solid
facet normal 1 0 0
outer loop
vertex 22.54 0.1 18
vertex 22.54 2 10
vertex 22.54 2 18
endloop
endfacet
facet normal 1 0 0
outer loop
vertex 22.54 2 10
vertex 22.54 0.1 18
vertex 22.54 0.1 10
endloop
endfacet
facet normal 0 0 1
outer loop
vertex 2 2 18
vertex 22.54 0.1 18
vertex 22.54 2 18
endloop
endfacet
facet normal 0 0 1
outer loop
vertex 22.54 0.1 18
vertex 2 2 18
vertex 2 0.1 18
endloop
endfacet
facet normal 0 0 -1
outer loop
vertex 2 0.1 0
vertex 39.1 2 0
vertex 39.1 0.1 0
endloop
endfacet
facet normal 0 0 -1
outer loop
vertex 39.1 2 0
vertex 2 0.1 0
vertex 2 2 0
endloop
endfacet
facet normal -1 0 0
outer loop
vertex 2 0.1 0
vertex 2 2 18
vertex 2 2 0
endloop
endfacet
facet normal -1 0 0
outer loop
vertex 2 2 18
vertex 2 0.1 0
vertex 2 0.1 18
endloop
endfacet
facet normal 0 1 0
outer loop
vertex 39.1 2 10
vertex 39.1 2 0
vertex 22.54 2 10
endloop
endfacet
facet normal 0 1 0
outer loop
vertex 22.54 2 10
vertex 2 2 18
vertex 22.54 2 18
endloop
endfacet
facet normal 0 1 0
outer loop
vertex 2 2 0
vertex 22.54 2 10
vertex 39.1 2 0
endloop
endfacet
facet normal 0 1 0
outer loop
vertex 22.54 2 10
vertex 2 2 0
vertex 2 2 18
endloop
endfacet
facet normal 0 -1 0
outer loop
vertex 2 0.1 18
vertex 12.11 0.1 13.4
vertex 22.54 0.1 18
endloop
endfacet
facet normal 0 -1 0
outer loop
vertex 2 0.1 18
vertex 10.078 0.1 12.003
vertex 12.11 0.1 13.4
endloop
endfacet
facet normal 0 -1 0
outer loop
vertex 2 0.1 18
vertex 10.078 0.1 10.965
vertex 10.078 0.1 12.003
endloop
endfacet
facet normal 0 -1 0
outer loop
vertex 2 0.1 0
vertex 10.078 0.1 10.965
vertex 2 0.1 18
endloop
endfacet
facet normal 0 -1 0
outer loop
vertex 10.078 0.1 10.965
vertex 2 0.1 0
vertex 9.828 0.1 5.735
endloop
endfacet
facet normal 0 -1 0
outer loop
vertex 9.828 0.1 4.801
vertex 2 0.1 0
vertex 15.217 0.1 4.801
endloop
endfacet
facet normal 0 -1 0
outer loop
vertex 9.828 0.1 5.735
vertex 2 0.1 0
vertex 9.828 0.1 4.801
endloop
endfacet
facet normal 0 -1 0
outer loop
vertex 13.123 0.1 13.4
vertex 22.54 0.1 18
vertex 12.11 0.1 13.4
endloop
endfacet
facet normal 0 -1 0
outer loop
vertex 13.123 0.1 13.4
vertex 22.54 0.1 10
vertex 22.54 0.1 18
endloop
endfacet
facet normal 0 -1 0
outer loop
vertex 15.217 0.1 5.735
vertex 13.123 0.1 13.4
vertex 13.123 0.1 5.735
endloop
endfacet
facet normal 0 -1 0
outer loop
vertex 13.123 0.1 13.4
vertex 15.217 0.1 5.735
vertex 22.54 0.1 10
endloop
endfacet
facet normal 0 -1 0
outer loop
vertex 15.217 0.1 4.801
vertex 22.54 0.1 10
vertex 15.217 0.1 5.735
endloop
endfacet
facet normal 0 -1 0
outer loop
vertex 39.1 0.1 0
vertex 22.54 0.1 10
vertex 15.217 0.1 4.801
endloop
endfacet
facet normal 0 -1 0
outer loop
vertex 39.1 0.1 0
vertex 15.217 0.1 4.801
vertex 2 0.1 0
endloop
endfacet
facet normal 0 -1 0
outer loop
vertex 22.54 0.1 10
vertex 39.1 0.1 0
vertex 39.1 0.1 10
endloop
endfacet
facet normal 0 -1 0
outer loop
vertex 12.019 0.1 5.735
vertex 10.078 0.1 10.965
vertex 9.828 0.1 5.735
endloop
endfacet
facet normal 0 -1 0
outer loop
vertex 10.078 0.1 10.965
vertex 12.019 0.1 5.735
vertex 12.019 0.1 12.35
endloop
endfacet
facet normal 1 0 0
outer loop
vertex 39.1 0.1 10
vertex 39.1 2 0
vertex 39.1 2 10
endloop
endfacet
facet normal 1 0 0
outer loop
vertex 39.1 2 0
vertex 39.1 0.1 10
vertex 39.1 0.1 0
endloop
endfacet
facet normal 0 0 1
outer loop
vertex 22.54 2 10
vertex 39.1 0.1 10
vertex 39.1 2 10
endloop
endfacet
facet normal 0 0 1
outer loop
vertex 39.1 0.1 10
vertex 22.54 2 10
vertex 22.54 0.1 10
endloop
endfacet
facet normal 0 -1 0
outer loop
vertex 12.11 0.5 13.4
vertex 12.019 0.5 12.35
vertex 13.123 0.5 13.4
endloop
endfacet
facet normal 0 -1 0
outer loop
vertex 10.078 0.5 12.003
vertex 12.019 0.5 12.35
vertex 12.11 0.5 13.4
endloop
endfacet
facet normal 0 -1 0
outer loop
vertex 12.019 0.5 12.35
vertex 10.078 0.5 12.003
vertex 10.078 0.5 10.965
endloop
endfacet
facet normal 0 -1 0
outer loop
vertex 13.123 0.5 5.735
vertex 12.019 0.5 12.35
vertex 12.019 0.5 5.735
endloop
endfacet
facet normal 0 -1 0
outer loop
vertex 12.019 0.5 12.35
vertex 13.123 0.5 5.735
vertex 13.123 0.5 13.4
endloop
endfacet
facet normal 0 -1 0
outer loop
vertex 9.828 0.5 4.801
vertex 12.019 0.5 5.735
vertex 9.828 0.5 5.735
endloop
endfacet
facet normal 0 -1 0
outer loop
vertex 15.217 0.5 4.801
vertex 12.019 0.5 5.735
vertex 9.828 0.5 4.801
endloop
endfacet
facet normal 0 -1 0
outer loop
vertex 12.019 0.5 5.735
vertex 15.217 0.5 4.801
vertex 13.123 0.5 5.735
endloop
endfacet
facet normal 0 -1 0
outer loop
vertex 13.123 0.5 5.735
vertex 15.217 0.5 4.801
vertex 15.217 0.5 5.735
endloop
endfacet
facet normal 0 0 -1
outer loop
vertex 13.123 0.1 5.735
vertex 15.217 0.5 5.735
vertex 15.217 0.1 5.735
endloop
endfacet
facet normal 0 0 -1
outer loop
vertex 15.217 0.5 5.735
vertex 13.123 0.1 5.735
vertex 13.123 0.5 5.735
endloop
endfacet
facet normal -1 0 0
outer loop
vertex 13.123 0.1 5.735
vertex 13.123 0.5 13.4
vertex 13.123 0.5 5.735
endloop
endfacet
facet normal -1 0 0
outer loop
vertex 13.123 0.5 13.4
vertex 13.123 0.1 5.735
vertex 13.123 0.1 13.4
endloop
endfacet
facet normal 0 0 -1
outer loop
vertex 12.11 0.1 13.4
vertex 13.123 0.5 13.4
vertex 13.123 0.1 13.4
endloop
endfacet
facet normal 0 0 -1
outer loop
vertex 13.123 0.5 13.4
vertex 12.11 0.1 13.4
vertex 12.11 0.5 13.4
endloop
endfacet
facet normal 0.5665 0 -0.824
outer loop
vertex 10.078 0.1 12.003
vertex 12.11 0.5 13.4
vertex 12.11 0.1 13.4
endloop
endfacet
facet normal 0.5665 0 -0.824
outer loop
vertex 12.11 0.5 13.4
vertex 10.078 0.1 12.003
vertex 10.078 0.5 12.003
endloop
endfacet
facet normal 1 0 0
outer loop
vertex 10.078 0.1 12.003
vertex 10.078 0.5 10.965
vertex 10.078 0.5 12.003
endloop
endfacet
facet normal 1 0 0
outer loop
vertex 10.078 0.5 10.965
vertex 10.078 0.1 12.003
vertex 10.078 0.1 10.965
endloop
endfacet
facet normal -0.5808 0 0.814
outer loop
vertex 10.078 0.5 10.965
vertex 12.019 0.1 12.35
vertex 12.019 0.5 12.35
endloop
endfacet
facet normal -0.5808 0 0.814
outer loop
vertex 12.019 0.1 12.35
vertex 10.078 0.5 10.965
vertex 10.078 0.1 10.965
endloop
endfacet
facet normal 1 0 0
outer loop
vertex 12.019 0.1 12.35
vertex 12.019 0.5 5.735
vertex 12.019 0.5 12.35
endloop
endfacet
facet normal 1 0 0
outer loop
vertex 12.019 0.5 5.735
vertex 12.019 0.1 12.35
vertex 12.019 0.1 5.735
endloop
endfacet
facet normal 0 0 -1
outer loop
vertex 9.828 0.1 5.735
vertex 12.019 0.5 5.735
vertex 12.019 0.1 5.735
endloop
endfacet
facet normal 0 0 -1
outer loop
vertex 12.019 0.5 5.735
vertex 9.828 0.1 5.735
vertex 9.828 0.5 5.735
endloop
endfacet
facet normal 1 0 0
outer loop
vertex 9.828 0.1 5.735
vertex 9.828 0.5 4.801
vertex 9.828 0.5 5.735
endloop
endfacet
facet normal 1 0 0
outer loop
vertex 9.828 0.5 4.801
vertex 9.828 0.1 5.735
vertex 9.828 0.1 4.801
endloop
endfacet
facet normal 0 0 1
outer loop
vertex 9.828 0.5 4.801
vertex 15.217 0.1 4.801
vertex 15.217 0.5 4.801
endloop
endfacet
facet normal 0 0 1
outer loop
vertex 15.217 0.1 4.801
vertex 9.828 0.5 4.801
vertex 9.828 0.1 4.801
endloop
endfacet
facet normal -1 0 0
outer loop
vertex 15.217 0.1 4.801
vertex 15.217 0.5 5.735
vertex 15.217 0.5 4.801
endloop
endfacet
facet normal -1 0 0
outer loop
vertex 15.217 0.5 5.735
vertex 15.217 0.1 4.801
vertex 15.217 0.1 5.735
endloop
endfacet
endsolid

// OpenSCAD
// file: params.scad
// spellchecker:ignore centreline counterbore datasheet elec usbc waveshare
// --- Display ---
// Waveshare 7.5inch e-Paper V2 (800×480). Datasheet:
// https://www.waveshare.com/w/upload/6/60/7.5inch_e-Paper_V2_Specification.pdf
display_w        = 111.2;  // display panel width  (mm) — portrait
display_h        = 170.2;  // display panel height (mm) — portrait
disp_thickness   =   1.25; // display panel thickness (mm) — datasheet 1.18; 1.25 gives 0.07mm extra shelf clearance
screen_area_w    =  97.92; // active screen width  (mm)
screen_area_h    = 163.2;  // active screen height (mm)
display_border_wide  =  9.78; // wide border (long edge, right side; = display_w − display_border_narrow − screen_area_w)
display_border_narrow=  3.5;  // narrow border (long edge, left/top/bottom = 1.2+1.5+0.8mm from datasheet)
display_border_short =  3.5;  // short-edge border (top and bottom)
disp_shift           =  0.6;  // additional downward Y offset on display; creates 1mm stopper lip on upper L-blocks

// --- Cavities (back shell interior) ---
elec_w         =  65;    // Pi Zero width  (mm)
elec_l         =  30;    // Pi Zero length (mm)
elec_depth     =  16;    // Pi Zero + PiSugar stack depth (mm) — 15.7mm actual
hat_w          =  30;    // Waveshare HAT width  (mm) — rotated 90° in case
hat_l          =  66;    // Waveshare HAT length (mm)
hat_depth      =   9.5;  // Waveshare HAT depth  (mm)
bat_w          =  28;    // battery width  (mm) — portrait: 28×59 footprint
bat_l          =  59;    // battery length (mm)
bat_depth      =  12.5;  // battery depth  (mm) — 10.7 body + 1.8 magnet

// --- Primitives first (no dependencies) ---
case_w         = 135;    // width  (mm) — 135mm clears 4mm nut towers with 1.5mm margin right of display
case_h         = 210;    // height (mm) — 2+170+35+2=209 → 210
front_depth    =   2;    // front bezel thickness (mm)
back_depth     =  20;    // back shell depth (mm) — elec_depth 15.7 + 2 wall + 2.3 clearance; unconfirmed
fillet_r       =   2;    // outer-edge fillet radius (mm)
edge_overhang_angle = 55; // chamfer→fillet transition (deg from horizontal); 45=safe, 55=X1C tuned
tol            = 0.2;    // FDM clearance on each mating face (mm)
wall_t         = 2;      // nominal wall thickness (mm)

// --- PiSugar flex-tab buttons (south wall) ---
btn_hinge_w     = 2;    // hinge strip width (mm) — right short edge, in-layer bending; flexing beam between fixed wall (_hinge_x1) and tab
btn_slot_kerf   = 1.0;  // slot kerf width (mm) — bottom horizontal slot (Z-direction gap), 0.7 will fuse to material below
btn_slot_kerf_top = 0.75; // slot kerf width (mm) — top horizontal slot (Z-direction gap)
btn_slot_kerf_x = 0.5;  // side slot kerf width (mm) — vertical free-side slot (X-direction gap); wider to prevent fusion

// --- Button area (front face, lower section below display) ---
btn_area_h     =  35;    // height of button zone at bottom of front face (mm)
btn_rows       =   2;
btn_cols       =   4;
btn_hole_tolerance = 0.2;
btn_hole_diameter = 10; // button hole diameter (mm) — physical cap sized to fit with tol clearance
btn_fillet_r   =   2;    // fillet radius on button hole outer edge (mm)
btn_zone_w     = case_w / btn_cols;   // each button is centred in its zone
btn_row_y1     = btn_area_h / 2 - 10;  // bottom row y centre
btn_row_y2     = btn_area_h / 2 + 4;  // top row y centre (closer to display)

// --- Carrier switch layout (shared with carrier.scad) ---
_sw            =  6;    // switch body footprint (mm)
_margin_y      =  1;    // Y margin beyond outermost switch edges (mm)
_loc_y1        = _sw / 2 + _margin_y;                   // 4mm  — bottom row centre in carrier coords
_loc_y2        = _loc_y1 + (btn_row_y2 - btn_row_y1);  // 18mm — top row centre in carrier coords

// --- Magnet recesses (back plate inner face) ---
magnet_d            = 15;   // diameter (mm) — derived from PiSugar image; tune after measuring
magnet_recess_depth = 1.5;  // depth into back plate; leaves 0.5mm wall

// --- Mating-face rabbet/tongue joint ---
rabbet_w       = 1;      // rabbet width into inner wall face (mm)
rabbet_d       = 1.5;    // rabbet depth from mating face (mm) — 2mm coincided with HDMI outer top

// --- M2 fasteners ---
screw_boss_id  = 2.1;    // screw shank clearance diameter (mm)
screw_head_d   = 4.0;    // screw head diameter (mm) — M2 button head, +clearance for circular-hole droop
screw_head_h   = wall_t; // screw head height (mm) — counterbore cuts through full wall thickness
screw_depth    = 25;     // total clearance hole depth from exterior (mm)
nut_af         = 4;      // hex nut across-flats (mm)
nut_t          = 1.6;    // hex nut thickness (mm)
tower_h        = 17;     // nut tower height from front plate inner face (mm) — 17mm leaves 1mm above back floor
tower_w        = 15;     // nut tower width in Y (mm)
// Y centres of the two screws per side; symmetric around case_h/2, clear of Pi stack (Y<32)
side_screw_y   = [case_h / 2 - case_h * 0.3, case_h / 2 + case_h * 0.3];

// --- USB-C notch ---
usbc_notch_w   =  12;    // notch width  (mm)
usbc_notch_h   =   4;    // notch height (mm)

// --- Derived positions (all dependencies above) ---
// Y=0 at bottom (USB-C / south face); X=0 at left inner wall
_elec_x  = wall_t + 0.3;              // Pi Zero left edge (0.3mm right of inner wall; SD card tip flush with exterior)
_elec_y  = wall_t;                   // Pi Zero bottom edge (USB-C face)
_bat_x   = _elec_x + elec_w - bat_w; // battery right edge aligned with Pi Zero right edge
_bat_y   = wall_t + elec_l;          // battery bottom edge above Pi Zero
// Display: active area centred; wide border on right long edge
_screen_x = (case_w - screen_area_w) / 2;   // active screen X centre in case
_disp_x   = _screen_x - display_border_narrow; // panel left edge (narrow border on left)
_disp_y   = btn_area_h + (case_h - btn_area_h - display_h) / 2;  // panel vertically centred above buttons
// HAT holder pegs: centred between left and middle display column pads;
// HAT (66mm long edge along X, rotated 90°) holes 57.5mm apart, 4.25mm in from each end
_hat_peg_x = (_disp_x + 10 + 15/2 + _disp_x + (display_w - 15)/2 + 15/2) / 2;
_hat_peg_y = _disp_y - disp_shift + (display_h - 15) / 2 + 15 + 27;
// (boss_inset removed — corner bosses replaced by side-entry screw towers)
// main file
// Insertable Pi-stack upper divider — two sections:
//   Section 1 (wall to pillar end): pillar height, front plate locks it in Z.
//   Section 2 (pillar end to battery wall): 10mm tall, leaves space for cables.

// spellchecker:ignore deboss halign insertable

include <params.scad>

// _pad/2 = 7.5 (matches back.scad local _pad = 15)
_s1_w = _disp_x + 7.5 - wall_t;                     // section 1 X width
_s2_w = _bat_x - (_disp_x + 7.5) - tol;              // section 2 X width (includes battery wall thickness)
_div_y = 2.1 - tol;                                  // tol/2 clearance per Y face (slot = 2.1mm)

module pi_stack_divider() {
    difference() {
        translate([wall_t, tol/2, 0]) {
            cube([_s1_w, _div_y, back_depth - wall_t]);   // section 1: full pillar height
            translate([_s1_w, 0, 0])
                cube([_s2_w, _div_y, 10]);                // section 2: cable clearance
        }
        // Alignment mark: deboss "1" into the opposite large face (same X/Z as
        // back.scad's mark, so the two "1"s line up through the part's
        // thickness when inserted) (text X = world X, text Y = world Z)
        translate([wall_t + _s1_w / 2, tol/2 + 0.4, (back_depth - wall_t) / 2])
            rotate([90, 0, 0])
                linear_extrude(0.4 + 0.1)
                    text("1", size = 9, halign = "center", valign = "center");
    }
}

pi_stack_divider();
